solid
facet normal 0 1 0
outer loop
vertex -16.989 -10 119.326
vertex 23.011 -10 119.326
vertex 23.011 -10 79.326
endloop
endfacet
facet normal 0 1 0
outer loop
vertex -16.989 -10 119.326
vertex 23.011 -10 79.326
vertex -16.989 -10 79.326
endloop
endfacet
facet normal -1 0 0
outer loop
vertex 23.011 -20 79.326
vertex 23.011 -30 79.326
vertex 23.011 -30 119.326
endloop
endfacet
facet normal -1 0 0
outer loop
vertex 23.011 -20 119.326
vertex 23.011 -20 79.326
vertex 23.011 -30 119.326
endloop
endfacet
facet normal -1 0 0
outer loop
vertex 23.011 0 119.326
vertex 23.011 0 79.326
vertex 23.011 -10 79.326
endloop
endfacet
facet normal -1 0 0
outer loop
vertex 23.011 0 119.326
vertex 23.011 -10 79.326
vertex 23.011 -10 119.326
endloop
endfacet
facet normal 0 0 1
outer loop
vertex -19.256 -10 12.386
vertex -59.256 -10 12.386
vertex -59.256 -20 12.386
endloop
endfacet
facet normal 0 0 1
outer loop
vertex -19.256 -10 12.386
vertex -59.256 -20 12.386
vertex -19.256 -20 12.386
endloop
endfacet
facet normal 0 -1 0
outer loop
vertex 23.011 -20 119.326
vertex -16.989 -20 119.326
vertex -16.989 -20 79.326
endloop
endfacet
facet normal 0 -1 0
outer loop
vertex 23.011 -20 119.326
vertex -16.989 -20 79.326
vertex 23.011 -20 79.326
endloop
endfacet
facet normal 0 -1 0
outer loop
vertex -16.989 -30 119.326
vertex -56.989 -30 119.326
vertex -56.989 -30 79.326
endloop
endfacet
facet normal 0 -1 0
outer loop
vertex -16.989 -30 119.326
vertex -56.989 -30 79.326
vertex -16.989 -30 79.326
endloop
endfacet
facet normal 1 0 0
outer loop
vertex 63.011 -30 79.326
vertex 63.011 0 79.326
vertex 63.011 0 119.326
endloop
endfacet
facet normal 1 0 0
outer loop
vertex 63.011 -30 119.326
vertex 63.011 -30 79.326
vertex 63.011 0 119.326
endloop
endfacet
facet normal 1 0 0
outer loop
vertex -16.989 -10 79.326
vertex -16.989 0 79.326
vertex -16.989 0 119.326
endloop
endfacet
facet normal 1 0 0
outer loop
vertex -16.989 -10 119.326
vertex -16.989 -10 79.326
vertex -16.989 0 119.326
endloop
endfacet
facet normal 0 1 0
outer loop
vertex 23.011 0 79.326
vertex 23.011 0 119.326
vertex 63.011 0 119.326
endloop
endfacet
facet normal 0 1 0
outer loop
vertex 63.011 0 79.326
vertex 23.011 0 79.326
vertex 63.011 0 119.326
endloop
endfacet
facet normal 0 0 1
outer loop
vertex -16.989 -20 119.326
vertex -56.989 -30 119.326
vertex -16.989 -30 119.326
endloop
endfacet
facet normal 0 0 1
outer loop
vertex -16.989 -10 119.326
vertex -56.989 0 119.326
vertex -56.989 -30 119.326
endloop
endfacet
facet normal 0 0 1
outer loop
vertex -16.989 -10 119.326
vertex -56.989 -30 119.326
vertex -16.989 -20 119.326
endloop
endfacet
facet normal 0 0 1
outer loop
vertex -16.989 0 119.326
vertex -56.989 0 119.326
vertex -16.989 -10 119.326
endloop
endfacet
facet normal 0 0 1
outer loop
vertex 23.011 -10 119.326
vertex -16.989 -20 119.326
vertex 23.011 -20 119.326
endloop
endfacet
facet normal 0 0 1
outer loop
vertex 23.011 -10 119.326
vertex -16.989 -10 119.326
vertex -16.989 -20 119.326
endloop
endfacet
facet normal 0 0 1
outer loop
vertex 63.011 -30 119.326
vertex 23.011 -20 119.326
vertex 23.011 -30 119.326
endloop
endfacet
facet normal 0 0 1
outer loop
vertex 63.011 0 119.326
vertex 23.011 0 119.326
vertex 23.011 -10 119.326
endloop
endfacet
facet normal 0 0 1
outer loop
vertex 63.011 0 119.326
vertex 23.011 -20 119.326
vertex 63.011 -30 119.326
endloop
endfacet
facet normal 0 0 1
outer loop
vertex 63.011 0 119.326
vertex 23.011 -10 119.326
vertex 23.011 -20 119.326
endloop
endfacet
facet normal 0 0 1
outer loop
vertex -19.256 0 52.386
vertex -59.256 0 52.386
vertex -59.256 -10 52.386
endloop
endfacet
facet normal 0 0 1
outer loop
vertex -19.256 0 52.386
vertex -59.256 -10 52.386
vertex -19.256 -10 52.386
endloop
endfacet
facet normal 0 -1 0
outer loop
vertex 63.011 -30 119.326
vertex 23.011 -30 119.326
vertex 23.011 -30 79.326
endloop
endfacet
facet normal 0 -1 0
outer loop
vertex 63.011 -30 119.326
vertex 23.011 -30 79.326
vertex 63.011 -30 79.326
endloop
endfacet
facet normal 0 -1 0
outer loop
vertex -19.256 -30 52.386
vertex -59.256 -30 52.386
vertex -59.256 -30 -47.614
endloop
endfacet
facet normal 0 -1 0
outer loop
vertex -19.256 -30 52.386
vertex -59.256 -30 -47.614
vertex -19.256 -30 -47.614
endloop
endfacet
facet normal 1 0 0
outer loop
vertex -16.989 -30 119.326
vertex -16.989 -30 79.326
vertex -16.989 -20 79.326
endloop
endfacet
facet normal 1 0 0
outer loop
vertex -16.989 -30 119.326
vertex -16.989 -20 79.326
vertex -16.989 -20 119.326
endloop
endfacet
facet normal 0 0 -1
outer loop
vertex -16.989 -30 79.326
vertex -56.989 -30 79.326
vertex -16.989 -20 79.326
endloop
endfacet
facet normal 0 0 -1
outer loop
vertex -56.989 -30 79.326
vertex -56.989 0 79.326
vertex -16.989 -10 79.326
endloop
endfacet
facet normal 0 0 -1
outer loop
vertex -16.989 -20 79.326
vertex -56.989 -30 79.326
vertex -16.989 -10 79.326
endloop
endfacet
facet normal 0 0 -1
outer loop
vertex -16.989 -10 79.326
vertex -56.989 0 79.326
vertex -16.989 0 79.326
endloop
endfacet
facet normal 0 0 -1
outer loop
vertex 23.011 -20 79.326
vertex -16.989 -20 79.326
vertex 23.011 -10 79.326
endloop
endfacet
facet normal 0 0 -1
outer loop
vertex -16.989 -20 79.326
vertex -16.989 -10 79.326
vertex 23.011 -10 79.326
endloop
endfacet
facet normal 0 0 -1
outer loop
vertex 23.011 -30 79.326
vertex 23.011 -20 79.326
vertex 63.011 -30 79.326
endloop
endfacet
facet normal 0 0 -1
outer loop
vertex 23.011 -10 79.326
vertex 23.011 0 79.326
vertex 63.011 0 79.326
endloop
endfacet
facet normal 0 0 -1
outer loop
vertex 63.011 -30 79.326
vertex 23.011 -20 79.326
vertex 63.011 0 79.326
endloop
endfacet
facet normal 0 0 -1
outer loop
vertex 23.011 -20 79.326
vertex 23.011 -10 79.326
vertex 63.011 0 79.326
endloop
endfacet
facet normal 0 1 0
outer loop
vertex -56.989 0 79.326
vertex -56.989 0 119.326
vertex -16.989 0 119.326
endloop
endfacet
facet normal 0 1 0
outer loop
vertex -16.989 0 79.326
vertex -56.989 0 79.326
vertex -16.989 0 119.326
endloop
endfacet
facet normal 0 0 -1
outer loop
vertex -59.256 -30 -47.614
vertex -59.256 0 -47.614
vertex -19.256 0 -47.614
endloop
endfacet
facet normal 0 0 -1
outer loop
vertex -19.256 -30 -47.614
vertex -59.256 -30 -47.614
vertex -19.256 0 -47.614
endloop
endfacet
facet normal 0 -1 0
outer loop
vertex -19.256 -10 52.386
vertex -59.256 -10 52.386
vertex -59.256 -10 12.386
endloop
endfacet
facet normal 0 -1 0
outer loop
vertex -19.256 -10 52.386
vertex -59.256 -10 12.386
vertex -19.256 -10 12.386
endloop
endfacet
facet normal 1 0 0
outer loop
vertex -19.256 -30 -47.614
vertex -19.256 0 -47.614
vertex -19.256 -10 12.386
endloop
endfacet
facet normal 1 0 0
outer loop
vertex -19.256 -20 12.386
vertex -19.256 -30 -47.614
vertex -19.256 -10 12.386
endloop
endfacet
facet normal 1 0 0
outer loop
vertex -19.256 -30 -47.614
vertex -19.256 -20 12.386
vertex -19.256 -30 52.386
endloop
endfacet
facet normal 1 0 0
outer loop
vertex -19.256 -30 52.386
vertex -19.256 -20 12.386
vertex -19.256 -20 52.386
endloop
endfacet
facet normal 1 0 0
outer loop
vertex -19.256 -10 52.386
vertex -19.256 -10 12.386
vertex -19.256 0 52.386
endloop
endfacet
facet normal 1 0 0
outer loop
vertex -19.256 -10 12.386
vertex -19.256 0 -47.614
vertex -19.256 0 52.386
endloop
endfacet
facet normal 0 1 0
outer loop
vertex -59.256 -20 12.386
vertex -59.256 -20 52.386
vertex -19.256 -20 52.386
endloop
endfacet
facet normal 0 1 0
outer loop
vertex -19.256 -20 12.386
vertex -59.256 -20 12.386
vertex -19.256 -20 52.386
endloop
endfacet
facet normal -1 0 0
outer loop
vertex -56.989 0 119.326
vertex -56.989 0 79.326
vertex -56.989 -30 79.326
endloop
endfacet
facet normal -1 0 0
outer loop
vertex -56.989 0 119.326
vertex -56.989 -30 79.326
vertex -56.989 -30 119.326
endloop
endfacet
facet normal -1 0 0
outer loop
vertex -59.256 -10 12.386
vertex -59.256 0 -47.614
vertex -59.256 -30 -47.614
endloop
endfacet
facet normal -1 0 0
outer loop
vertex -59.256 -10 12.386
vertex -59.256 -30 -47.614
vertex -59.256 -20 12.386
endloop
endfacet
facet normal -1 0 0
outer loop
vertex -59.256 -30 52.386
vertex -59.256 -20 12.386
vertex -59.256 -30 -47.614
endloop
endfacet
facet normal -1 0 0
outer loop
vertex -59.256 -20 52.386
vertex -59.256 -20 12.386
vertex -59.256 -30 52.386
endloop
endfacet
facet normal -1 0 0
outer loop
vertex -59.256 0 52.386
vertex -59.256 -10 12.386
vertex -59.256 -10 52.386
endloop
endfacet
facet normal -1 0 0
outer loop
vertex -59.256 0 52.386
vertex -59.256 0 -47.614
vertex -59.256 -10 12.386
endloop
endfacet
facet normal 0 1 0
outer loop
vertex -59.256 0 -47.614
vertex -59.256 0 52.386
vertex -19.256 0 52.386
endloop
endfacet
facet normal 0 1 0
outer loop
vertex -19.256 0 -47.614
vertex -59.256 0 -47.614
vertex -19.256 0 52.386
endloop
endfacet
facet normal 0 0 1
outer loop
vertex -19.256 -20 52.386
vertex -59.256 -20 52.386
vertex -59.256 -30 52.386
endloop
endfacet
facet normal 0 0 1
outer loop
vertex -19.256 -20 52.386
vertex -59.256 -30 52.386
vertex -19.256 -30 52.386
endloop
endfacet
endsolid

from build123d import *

# Parameters (mm, degrees)
F0_W     = 40
F0_H     = 100
F1_DEPTH = 30
F2_W     = 40
F2_H     = 10
F3_DEPTH = 40
F4_W     = 120
F4_H     = 40
F5_DEPTH = 30
F6_W     = 40
F6_H     = 40
F7_DEPTH = 10
F8_W     = 40
F8_H     = 40
F9_DEPTH = 10


with BuildPart() as f1:
    # F0 (on Front) → F1 (new body)
    with BuildSketch(Plane.XZ):
        with Locations((-39.255778, 2.386363)):
            Rectangle(F0_W, F0_H)
    extrude(amount=F1_DEPTH)

    # F2 (on face) → F3 (cut)
    with BuildSketch(Plane.XY.offset(52.386363)):
        with Locations((-39.255778, -15)):
            Rectangle(F2_W, F2_H)
    extrude(amount=-F3_DEPTH, mode=Mode.SUBTRACT)


with BuildPart() as f5:
    # F4 (on Front) → F5 (new body)
    with BuildSketch(Plane.XZ):
        with Locations((3.011037, 99.326296)):
            Rectangle(F4_W, F4_H)
    extrude(amount=F5_DEPTH)

    # F6 (on face) → F7 (cut)
    with BuildSketch(Plane.XZ.offset(30)):
        with Locations((3.011037, 99.326296)):
            Rectangle(F6_W, F6_H)
    extrude(amount=-F7_DEPTH, mode=Mode.SUBTRACT)

    # F8 (on face) → F9 (cut)
    with BuildSketch(Plane(origin=(0, 0, 0), x_dir=(-1, 0, 0), z_dir=(0, 1, 0))):
        with Locations((-3.011037, 99.326296)):
            Rectangle(F8_W, F8_H)
    extrude(amount=-F9_DEPTH, mode=Mode.SUBTRACT)


solid = Compound([f1.part, f5.part])
